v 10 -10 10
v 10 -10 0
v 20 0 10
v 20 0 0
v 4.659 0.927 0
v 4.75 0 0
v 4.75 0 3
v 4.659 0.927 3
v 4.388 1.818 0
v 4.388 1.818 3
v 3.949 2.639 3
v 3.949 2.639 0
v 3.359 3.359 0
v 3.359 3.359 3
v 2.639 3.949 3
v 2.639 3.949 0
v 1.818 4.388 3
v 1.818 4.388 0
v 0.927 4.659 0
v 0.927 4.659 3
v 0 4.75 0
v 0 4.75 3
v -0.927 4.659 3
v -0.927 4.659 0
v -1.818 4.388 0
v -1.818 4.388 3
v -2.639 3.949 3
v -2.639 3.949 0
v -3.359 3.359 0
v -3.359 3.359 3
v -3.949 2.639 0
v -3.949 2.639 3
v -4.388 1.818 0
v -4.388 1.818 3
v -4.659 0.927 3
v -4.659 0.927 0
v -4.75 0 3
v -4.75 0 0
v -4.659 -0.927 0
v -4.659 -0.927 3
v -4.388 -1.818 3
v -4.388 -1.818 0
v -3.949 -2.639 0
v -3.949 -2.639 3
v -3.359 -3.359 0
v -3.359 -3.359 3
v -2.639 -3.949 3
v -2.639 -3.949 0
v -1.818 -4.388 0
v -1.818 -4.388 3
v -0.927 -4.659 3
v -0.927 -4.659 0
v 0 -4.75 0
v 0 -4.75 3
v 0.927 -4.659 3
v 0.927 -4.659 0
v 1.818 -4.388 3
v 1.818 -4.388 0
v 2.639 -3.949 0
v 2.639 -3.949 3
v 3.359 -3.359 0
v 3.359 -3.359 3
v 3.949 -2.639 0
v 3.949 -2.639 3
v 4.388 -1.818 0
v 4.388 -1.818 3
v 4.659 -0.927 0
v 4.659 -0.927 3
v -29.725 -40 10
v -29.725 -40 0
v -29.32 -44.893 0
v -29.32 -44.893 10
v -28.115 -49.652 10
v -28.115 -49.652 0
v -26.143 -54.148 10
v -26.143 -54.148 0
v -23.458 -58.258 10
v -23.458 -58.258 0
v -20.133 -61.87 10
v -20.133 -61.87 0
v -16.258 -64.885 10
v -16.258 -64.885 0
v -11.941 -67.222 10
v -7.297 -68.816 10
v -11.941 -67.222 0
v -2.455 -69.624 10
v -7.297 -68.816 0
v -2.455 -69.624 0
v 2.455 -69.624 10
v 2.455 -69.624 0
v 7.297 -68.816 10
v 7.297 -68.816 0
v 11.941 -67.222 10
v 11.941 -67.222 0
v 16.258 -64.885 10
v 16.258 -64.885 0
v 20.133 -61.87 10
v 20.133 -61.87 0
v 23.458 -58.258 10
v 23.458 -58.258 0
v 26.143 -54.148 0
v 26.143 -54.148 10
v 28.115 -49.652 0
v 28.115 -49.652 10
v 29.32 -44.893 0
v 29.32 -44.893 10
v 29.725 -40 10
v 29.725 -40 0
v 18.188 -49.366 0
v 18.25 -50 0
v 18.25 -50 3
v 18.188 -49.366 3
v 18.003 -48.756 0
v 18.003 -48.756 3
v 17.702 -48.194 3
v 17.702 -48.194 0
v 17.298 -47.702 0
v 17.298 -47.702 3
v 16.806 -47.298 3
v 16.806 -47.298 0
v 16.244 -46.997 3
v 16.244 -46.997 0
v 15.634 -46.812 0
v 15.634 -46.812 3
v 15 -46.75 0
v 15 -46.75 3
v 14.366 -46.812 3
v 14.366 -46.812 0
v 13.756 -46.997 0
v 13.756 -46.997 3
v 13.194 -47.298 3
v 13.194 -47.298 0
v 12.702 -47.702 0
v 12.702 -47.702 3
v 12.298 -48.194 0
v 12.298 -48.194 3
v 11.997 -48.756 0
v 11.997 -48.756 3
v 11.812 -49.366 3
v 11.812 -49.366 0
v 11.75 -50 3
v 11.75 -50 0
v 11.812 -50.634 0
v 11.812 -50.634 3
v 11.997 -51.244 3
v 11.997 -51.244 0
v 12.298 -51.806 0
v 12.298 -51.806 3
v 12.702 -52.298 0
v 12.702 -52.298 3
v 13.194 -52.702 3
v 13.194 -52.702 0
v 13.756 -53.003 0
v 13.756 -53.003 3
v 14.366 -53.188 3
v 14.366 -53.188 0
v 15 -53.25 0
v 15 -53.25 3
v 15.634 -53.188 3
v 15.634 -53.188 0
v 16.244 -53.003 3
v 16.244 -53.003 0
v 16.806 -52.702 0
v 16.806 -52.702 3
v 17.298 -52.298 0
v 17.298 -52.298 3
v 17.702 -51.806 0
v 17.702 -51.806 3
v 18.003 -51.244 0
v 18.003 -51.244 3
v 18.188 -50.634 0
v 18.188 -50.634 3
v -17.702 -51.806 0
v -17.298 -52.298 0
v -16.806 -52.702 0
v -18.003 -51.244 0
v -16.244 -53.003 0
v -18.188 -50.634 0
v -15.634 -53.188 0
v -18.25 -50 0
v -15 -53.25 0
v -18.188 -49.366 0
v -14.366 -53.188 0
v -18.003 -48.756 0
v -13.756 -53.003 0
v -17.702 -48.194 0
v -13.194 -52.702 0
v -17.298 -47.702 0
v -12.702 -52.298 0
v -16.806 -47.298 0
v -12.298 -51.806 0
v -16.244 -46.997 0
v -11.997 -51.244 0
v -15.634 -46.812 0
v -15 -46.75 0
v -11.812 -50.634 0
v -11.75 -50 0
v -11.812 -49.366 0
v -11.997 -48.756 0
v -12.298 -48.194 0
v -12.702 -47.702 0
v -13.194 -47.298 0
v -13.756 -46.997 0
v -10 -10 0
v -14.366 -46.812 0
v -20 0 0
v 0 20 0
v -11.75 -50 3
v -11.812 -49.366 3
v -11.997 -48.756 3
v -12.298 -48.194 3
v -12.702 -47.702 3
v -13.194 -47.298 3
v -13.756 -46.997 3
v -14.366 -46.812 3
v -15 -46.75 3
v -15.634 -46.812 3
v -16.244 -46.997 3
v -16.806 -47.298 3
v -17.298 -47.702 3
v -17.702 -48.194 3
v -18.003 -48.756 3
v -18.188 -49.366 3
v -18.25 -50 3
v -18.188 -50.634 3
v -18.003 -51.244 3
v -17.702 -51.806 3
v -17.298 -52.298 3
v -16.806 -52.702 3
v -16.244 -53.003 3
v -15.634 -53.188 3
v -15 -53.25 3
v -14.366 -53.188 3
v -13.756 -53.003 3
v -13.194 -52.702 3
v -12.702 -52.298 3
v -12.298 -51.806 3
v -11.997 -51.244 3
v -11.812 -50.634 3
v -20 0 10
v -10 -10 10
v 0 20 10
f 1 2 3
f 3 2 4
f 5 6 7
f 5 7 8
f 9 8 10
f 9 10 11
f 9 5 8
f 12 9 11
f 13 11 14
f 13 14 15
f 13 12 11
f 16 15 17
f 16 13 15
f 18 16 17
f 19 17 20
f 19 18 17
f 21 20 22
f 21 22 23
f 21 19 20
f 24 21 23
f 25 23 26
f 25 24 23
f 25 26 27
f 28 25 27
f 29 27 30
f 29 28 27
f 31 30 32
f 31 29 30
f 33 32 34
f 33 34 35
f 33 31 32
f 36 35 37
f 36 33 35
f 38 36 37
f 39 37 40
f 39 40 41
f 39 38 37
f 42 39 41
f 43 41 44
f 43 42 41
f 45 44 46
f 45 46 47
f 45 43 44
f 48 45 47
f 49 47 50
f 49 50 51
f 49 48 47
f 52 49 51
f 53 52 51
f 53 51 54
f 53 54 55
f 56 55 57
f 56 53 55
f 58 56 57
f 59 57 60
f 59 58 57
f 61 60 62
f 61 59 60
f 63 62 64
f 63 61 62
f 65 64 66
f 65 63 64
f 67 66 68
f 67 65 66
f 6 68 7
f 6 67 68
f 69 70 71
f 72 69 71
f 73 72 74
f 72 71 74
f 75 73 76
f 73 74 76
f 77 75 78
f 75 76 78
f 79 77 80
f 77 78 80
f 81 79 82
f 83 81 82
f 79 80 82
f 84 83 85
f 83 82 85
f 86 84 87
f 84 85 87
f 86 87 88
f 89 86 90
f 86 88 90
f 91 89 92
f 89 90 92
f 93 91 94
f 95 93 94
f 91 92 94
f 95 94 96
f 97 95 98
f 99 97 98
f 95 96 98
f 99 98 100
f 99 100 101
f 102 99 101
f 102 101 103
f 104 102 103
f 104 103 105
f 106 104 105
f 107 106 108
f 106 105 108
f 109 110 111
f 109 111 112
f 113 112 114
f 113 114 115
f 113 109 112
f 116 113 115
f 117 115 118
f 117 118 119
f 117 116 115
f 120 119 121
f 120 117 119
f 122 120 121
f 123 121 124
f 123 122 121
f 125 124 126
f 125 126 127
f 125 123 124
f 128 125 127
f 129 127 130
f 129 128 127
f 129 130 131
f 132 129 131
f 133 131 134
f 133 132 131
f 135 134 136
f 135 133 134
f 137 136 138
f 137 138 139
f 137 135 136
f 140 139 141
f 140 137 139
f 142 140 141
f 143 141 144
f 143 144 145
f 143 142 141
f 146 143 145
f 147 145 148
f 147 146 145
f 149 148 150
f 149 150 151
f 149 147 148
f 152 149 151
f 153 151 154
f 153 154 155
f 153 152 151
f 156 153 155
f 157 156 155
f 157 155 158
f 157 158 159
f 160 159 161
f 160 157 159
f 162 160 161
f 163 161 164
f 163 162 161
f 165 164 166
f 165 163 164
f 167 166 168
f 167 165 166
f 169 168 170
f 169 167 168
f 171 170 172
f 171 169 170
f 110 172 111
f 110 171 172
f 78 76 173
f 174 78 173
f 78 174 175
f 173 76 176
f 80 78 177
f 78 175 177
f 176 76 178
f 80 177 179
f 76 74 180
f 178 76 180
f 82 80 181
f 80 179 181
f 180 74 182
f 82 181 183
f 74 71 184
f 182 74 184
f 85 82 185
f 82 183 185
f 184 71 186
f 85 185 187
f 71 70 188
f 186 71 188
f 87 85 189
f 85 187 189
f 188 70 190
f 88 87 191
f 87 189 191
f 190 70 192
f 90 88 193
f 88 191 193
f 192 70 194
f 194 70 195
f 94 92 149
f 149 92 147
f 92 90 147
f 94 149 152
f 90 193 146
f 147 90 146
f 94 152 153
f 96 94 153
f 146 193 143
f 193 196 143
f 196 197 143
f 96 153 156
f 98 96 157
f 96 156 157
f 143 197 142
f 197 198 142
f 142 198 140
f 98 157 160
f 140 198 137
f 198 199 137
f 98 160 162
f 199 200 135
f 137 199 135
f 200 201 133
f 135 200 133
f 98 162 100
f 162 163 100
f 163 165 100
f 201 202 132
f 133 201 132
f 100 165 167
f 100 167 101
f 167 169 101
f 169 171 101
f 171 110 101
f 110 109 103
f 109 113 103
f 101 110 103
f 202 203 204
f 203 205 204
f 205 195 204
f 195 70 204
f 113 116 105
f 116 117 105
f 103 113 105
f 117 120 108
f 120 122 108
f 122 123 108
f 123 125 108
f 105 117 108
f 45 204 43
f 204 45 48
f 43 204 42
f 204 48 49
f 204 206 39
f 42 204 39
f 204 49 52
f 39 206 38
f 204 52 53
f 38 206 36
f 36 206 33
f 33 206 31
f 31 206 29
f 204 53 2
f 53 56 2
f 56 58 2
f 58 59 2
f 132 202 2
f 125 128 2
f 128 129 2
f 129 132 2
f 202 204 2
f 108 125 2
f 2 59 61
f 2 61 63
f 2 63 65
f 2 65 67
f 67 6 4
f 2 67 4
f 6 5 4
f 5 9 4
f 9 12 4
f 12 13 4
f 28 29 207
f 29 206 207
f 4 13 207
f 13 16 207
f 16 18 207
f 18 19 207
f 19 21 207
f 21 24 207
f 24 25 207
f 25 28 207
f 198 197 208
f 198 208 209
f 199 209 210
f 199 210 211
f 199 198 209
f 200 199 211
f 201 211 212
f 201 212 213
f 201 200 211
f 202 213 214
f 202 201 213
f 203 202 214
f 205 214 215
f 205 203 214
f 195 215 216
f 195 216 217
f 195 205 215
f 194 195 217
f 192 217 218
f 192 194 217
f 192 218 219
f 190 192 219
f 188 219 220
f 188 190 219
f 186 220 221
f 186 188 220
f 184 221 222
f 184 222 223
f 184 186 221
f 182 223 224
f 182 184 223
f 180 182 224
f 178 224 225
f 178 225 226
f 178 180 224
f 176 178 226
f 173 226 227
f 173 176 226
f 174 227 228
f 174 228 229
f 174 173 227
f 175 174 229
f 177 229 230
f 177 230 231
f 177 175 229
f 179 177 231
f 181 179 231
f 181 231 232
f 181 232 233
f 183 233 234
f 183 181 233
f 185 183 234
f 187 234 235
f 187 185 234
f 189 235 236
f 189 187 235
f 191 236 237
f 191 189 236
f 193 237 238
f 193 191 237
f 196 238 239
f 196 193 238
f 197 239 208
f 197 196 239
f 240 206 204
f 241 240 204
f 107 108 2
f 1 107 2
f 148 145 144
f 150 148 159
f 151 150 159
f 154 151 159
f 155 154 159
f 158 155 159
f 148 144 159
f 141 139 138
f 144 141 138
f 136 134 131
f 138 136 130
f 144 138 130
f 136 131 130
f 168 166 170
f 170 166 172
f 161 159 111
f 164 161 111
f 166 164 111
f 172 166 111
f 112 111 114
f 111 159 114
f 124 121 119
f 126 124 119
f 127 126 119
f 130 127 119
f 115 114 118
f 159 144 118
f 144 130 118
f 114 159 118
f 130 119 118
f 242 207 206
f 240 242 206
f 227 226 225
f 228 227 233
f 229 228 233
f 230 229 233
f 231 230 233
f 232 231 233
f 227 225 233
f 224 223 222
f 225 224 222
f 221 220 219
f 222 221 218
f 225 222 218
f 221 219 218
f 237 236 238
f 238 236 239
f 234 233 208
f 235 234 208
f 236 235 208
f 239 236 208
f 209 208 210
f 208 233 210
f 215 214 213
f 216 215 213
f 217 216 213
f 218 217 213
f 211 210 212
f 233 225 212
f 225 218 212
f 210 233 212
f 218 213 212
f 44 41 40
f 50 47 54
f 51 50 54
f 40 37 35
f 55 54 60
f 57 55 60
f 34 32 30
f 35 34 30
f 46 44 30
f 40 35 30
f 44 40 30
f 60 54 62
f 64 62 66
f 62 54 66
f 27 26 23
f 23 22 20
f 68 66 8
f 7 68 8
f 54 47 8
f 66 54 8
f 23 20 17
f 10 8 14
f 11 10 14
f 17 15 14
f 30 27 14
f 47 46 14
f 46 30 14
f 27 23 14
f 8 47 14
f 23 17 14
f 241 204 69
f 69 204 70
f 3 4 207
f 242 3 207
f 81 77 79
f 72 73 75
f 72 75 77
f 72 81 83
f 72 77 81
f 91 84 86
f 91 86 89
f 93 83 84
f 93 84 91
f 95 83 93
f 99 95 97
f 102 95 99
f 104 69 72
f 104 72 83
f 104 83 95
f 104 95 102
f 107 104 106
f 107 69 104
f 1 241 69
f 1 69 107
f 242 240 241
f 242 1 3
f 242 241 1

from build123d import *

# Parameters (mm, degrees)
F1_DEPTH = 10
F2_R     = 4.75
F2_R_2   = 3.25
F3_DEPTH = 3


with BuildPart() as f1:
    # F0 (on Top) → F1 (new body)
    with BuildSketch(Plane.XY):
        Polygon((10, -10), (20, 0), (0, 20), (-20, 0), (-10, -10), (0, -20), align=None)
        with BuildLine():
            Line((29.725478, -40), (10, -10))
            Line((10, -10), (0, -20))
            Line((0, -20), (-10, -10))
            Line((-10, -10), (-29.725478, -40))
            ThreePointArc((-29.725478, -40), (0, -69.725478), (29.725478, -40))
        make_face()
    extrude(amount=F1_DEPTH)

    # F2 (on Top) → F3 (cut)
    with BuildSketch(Plane.XY):
        Circle(F2_R)
        with Locations((15, -50)):
            Circle(F2_R_2)
        with Locations((-15, -50)):
            Circle(F2_R_2)
    extrude(amount=F3_DEPTH, mode=Mode.SUBTRACT)


solid = f1.part
